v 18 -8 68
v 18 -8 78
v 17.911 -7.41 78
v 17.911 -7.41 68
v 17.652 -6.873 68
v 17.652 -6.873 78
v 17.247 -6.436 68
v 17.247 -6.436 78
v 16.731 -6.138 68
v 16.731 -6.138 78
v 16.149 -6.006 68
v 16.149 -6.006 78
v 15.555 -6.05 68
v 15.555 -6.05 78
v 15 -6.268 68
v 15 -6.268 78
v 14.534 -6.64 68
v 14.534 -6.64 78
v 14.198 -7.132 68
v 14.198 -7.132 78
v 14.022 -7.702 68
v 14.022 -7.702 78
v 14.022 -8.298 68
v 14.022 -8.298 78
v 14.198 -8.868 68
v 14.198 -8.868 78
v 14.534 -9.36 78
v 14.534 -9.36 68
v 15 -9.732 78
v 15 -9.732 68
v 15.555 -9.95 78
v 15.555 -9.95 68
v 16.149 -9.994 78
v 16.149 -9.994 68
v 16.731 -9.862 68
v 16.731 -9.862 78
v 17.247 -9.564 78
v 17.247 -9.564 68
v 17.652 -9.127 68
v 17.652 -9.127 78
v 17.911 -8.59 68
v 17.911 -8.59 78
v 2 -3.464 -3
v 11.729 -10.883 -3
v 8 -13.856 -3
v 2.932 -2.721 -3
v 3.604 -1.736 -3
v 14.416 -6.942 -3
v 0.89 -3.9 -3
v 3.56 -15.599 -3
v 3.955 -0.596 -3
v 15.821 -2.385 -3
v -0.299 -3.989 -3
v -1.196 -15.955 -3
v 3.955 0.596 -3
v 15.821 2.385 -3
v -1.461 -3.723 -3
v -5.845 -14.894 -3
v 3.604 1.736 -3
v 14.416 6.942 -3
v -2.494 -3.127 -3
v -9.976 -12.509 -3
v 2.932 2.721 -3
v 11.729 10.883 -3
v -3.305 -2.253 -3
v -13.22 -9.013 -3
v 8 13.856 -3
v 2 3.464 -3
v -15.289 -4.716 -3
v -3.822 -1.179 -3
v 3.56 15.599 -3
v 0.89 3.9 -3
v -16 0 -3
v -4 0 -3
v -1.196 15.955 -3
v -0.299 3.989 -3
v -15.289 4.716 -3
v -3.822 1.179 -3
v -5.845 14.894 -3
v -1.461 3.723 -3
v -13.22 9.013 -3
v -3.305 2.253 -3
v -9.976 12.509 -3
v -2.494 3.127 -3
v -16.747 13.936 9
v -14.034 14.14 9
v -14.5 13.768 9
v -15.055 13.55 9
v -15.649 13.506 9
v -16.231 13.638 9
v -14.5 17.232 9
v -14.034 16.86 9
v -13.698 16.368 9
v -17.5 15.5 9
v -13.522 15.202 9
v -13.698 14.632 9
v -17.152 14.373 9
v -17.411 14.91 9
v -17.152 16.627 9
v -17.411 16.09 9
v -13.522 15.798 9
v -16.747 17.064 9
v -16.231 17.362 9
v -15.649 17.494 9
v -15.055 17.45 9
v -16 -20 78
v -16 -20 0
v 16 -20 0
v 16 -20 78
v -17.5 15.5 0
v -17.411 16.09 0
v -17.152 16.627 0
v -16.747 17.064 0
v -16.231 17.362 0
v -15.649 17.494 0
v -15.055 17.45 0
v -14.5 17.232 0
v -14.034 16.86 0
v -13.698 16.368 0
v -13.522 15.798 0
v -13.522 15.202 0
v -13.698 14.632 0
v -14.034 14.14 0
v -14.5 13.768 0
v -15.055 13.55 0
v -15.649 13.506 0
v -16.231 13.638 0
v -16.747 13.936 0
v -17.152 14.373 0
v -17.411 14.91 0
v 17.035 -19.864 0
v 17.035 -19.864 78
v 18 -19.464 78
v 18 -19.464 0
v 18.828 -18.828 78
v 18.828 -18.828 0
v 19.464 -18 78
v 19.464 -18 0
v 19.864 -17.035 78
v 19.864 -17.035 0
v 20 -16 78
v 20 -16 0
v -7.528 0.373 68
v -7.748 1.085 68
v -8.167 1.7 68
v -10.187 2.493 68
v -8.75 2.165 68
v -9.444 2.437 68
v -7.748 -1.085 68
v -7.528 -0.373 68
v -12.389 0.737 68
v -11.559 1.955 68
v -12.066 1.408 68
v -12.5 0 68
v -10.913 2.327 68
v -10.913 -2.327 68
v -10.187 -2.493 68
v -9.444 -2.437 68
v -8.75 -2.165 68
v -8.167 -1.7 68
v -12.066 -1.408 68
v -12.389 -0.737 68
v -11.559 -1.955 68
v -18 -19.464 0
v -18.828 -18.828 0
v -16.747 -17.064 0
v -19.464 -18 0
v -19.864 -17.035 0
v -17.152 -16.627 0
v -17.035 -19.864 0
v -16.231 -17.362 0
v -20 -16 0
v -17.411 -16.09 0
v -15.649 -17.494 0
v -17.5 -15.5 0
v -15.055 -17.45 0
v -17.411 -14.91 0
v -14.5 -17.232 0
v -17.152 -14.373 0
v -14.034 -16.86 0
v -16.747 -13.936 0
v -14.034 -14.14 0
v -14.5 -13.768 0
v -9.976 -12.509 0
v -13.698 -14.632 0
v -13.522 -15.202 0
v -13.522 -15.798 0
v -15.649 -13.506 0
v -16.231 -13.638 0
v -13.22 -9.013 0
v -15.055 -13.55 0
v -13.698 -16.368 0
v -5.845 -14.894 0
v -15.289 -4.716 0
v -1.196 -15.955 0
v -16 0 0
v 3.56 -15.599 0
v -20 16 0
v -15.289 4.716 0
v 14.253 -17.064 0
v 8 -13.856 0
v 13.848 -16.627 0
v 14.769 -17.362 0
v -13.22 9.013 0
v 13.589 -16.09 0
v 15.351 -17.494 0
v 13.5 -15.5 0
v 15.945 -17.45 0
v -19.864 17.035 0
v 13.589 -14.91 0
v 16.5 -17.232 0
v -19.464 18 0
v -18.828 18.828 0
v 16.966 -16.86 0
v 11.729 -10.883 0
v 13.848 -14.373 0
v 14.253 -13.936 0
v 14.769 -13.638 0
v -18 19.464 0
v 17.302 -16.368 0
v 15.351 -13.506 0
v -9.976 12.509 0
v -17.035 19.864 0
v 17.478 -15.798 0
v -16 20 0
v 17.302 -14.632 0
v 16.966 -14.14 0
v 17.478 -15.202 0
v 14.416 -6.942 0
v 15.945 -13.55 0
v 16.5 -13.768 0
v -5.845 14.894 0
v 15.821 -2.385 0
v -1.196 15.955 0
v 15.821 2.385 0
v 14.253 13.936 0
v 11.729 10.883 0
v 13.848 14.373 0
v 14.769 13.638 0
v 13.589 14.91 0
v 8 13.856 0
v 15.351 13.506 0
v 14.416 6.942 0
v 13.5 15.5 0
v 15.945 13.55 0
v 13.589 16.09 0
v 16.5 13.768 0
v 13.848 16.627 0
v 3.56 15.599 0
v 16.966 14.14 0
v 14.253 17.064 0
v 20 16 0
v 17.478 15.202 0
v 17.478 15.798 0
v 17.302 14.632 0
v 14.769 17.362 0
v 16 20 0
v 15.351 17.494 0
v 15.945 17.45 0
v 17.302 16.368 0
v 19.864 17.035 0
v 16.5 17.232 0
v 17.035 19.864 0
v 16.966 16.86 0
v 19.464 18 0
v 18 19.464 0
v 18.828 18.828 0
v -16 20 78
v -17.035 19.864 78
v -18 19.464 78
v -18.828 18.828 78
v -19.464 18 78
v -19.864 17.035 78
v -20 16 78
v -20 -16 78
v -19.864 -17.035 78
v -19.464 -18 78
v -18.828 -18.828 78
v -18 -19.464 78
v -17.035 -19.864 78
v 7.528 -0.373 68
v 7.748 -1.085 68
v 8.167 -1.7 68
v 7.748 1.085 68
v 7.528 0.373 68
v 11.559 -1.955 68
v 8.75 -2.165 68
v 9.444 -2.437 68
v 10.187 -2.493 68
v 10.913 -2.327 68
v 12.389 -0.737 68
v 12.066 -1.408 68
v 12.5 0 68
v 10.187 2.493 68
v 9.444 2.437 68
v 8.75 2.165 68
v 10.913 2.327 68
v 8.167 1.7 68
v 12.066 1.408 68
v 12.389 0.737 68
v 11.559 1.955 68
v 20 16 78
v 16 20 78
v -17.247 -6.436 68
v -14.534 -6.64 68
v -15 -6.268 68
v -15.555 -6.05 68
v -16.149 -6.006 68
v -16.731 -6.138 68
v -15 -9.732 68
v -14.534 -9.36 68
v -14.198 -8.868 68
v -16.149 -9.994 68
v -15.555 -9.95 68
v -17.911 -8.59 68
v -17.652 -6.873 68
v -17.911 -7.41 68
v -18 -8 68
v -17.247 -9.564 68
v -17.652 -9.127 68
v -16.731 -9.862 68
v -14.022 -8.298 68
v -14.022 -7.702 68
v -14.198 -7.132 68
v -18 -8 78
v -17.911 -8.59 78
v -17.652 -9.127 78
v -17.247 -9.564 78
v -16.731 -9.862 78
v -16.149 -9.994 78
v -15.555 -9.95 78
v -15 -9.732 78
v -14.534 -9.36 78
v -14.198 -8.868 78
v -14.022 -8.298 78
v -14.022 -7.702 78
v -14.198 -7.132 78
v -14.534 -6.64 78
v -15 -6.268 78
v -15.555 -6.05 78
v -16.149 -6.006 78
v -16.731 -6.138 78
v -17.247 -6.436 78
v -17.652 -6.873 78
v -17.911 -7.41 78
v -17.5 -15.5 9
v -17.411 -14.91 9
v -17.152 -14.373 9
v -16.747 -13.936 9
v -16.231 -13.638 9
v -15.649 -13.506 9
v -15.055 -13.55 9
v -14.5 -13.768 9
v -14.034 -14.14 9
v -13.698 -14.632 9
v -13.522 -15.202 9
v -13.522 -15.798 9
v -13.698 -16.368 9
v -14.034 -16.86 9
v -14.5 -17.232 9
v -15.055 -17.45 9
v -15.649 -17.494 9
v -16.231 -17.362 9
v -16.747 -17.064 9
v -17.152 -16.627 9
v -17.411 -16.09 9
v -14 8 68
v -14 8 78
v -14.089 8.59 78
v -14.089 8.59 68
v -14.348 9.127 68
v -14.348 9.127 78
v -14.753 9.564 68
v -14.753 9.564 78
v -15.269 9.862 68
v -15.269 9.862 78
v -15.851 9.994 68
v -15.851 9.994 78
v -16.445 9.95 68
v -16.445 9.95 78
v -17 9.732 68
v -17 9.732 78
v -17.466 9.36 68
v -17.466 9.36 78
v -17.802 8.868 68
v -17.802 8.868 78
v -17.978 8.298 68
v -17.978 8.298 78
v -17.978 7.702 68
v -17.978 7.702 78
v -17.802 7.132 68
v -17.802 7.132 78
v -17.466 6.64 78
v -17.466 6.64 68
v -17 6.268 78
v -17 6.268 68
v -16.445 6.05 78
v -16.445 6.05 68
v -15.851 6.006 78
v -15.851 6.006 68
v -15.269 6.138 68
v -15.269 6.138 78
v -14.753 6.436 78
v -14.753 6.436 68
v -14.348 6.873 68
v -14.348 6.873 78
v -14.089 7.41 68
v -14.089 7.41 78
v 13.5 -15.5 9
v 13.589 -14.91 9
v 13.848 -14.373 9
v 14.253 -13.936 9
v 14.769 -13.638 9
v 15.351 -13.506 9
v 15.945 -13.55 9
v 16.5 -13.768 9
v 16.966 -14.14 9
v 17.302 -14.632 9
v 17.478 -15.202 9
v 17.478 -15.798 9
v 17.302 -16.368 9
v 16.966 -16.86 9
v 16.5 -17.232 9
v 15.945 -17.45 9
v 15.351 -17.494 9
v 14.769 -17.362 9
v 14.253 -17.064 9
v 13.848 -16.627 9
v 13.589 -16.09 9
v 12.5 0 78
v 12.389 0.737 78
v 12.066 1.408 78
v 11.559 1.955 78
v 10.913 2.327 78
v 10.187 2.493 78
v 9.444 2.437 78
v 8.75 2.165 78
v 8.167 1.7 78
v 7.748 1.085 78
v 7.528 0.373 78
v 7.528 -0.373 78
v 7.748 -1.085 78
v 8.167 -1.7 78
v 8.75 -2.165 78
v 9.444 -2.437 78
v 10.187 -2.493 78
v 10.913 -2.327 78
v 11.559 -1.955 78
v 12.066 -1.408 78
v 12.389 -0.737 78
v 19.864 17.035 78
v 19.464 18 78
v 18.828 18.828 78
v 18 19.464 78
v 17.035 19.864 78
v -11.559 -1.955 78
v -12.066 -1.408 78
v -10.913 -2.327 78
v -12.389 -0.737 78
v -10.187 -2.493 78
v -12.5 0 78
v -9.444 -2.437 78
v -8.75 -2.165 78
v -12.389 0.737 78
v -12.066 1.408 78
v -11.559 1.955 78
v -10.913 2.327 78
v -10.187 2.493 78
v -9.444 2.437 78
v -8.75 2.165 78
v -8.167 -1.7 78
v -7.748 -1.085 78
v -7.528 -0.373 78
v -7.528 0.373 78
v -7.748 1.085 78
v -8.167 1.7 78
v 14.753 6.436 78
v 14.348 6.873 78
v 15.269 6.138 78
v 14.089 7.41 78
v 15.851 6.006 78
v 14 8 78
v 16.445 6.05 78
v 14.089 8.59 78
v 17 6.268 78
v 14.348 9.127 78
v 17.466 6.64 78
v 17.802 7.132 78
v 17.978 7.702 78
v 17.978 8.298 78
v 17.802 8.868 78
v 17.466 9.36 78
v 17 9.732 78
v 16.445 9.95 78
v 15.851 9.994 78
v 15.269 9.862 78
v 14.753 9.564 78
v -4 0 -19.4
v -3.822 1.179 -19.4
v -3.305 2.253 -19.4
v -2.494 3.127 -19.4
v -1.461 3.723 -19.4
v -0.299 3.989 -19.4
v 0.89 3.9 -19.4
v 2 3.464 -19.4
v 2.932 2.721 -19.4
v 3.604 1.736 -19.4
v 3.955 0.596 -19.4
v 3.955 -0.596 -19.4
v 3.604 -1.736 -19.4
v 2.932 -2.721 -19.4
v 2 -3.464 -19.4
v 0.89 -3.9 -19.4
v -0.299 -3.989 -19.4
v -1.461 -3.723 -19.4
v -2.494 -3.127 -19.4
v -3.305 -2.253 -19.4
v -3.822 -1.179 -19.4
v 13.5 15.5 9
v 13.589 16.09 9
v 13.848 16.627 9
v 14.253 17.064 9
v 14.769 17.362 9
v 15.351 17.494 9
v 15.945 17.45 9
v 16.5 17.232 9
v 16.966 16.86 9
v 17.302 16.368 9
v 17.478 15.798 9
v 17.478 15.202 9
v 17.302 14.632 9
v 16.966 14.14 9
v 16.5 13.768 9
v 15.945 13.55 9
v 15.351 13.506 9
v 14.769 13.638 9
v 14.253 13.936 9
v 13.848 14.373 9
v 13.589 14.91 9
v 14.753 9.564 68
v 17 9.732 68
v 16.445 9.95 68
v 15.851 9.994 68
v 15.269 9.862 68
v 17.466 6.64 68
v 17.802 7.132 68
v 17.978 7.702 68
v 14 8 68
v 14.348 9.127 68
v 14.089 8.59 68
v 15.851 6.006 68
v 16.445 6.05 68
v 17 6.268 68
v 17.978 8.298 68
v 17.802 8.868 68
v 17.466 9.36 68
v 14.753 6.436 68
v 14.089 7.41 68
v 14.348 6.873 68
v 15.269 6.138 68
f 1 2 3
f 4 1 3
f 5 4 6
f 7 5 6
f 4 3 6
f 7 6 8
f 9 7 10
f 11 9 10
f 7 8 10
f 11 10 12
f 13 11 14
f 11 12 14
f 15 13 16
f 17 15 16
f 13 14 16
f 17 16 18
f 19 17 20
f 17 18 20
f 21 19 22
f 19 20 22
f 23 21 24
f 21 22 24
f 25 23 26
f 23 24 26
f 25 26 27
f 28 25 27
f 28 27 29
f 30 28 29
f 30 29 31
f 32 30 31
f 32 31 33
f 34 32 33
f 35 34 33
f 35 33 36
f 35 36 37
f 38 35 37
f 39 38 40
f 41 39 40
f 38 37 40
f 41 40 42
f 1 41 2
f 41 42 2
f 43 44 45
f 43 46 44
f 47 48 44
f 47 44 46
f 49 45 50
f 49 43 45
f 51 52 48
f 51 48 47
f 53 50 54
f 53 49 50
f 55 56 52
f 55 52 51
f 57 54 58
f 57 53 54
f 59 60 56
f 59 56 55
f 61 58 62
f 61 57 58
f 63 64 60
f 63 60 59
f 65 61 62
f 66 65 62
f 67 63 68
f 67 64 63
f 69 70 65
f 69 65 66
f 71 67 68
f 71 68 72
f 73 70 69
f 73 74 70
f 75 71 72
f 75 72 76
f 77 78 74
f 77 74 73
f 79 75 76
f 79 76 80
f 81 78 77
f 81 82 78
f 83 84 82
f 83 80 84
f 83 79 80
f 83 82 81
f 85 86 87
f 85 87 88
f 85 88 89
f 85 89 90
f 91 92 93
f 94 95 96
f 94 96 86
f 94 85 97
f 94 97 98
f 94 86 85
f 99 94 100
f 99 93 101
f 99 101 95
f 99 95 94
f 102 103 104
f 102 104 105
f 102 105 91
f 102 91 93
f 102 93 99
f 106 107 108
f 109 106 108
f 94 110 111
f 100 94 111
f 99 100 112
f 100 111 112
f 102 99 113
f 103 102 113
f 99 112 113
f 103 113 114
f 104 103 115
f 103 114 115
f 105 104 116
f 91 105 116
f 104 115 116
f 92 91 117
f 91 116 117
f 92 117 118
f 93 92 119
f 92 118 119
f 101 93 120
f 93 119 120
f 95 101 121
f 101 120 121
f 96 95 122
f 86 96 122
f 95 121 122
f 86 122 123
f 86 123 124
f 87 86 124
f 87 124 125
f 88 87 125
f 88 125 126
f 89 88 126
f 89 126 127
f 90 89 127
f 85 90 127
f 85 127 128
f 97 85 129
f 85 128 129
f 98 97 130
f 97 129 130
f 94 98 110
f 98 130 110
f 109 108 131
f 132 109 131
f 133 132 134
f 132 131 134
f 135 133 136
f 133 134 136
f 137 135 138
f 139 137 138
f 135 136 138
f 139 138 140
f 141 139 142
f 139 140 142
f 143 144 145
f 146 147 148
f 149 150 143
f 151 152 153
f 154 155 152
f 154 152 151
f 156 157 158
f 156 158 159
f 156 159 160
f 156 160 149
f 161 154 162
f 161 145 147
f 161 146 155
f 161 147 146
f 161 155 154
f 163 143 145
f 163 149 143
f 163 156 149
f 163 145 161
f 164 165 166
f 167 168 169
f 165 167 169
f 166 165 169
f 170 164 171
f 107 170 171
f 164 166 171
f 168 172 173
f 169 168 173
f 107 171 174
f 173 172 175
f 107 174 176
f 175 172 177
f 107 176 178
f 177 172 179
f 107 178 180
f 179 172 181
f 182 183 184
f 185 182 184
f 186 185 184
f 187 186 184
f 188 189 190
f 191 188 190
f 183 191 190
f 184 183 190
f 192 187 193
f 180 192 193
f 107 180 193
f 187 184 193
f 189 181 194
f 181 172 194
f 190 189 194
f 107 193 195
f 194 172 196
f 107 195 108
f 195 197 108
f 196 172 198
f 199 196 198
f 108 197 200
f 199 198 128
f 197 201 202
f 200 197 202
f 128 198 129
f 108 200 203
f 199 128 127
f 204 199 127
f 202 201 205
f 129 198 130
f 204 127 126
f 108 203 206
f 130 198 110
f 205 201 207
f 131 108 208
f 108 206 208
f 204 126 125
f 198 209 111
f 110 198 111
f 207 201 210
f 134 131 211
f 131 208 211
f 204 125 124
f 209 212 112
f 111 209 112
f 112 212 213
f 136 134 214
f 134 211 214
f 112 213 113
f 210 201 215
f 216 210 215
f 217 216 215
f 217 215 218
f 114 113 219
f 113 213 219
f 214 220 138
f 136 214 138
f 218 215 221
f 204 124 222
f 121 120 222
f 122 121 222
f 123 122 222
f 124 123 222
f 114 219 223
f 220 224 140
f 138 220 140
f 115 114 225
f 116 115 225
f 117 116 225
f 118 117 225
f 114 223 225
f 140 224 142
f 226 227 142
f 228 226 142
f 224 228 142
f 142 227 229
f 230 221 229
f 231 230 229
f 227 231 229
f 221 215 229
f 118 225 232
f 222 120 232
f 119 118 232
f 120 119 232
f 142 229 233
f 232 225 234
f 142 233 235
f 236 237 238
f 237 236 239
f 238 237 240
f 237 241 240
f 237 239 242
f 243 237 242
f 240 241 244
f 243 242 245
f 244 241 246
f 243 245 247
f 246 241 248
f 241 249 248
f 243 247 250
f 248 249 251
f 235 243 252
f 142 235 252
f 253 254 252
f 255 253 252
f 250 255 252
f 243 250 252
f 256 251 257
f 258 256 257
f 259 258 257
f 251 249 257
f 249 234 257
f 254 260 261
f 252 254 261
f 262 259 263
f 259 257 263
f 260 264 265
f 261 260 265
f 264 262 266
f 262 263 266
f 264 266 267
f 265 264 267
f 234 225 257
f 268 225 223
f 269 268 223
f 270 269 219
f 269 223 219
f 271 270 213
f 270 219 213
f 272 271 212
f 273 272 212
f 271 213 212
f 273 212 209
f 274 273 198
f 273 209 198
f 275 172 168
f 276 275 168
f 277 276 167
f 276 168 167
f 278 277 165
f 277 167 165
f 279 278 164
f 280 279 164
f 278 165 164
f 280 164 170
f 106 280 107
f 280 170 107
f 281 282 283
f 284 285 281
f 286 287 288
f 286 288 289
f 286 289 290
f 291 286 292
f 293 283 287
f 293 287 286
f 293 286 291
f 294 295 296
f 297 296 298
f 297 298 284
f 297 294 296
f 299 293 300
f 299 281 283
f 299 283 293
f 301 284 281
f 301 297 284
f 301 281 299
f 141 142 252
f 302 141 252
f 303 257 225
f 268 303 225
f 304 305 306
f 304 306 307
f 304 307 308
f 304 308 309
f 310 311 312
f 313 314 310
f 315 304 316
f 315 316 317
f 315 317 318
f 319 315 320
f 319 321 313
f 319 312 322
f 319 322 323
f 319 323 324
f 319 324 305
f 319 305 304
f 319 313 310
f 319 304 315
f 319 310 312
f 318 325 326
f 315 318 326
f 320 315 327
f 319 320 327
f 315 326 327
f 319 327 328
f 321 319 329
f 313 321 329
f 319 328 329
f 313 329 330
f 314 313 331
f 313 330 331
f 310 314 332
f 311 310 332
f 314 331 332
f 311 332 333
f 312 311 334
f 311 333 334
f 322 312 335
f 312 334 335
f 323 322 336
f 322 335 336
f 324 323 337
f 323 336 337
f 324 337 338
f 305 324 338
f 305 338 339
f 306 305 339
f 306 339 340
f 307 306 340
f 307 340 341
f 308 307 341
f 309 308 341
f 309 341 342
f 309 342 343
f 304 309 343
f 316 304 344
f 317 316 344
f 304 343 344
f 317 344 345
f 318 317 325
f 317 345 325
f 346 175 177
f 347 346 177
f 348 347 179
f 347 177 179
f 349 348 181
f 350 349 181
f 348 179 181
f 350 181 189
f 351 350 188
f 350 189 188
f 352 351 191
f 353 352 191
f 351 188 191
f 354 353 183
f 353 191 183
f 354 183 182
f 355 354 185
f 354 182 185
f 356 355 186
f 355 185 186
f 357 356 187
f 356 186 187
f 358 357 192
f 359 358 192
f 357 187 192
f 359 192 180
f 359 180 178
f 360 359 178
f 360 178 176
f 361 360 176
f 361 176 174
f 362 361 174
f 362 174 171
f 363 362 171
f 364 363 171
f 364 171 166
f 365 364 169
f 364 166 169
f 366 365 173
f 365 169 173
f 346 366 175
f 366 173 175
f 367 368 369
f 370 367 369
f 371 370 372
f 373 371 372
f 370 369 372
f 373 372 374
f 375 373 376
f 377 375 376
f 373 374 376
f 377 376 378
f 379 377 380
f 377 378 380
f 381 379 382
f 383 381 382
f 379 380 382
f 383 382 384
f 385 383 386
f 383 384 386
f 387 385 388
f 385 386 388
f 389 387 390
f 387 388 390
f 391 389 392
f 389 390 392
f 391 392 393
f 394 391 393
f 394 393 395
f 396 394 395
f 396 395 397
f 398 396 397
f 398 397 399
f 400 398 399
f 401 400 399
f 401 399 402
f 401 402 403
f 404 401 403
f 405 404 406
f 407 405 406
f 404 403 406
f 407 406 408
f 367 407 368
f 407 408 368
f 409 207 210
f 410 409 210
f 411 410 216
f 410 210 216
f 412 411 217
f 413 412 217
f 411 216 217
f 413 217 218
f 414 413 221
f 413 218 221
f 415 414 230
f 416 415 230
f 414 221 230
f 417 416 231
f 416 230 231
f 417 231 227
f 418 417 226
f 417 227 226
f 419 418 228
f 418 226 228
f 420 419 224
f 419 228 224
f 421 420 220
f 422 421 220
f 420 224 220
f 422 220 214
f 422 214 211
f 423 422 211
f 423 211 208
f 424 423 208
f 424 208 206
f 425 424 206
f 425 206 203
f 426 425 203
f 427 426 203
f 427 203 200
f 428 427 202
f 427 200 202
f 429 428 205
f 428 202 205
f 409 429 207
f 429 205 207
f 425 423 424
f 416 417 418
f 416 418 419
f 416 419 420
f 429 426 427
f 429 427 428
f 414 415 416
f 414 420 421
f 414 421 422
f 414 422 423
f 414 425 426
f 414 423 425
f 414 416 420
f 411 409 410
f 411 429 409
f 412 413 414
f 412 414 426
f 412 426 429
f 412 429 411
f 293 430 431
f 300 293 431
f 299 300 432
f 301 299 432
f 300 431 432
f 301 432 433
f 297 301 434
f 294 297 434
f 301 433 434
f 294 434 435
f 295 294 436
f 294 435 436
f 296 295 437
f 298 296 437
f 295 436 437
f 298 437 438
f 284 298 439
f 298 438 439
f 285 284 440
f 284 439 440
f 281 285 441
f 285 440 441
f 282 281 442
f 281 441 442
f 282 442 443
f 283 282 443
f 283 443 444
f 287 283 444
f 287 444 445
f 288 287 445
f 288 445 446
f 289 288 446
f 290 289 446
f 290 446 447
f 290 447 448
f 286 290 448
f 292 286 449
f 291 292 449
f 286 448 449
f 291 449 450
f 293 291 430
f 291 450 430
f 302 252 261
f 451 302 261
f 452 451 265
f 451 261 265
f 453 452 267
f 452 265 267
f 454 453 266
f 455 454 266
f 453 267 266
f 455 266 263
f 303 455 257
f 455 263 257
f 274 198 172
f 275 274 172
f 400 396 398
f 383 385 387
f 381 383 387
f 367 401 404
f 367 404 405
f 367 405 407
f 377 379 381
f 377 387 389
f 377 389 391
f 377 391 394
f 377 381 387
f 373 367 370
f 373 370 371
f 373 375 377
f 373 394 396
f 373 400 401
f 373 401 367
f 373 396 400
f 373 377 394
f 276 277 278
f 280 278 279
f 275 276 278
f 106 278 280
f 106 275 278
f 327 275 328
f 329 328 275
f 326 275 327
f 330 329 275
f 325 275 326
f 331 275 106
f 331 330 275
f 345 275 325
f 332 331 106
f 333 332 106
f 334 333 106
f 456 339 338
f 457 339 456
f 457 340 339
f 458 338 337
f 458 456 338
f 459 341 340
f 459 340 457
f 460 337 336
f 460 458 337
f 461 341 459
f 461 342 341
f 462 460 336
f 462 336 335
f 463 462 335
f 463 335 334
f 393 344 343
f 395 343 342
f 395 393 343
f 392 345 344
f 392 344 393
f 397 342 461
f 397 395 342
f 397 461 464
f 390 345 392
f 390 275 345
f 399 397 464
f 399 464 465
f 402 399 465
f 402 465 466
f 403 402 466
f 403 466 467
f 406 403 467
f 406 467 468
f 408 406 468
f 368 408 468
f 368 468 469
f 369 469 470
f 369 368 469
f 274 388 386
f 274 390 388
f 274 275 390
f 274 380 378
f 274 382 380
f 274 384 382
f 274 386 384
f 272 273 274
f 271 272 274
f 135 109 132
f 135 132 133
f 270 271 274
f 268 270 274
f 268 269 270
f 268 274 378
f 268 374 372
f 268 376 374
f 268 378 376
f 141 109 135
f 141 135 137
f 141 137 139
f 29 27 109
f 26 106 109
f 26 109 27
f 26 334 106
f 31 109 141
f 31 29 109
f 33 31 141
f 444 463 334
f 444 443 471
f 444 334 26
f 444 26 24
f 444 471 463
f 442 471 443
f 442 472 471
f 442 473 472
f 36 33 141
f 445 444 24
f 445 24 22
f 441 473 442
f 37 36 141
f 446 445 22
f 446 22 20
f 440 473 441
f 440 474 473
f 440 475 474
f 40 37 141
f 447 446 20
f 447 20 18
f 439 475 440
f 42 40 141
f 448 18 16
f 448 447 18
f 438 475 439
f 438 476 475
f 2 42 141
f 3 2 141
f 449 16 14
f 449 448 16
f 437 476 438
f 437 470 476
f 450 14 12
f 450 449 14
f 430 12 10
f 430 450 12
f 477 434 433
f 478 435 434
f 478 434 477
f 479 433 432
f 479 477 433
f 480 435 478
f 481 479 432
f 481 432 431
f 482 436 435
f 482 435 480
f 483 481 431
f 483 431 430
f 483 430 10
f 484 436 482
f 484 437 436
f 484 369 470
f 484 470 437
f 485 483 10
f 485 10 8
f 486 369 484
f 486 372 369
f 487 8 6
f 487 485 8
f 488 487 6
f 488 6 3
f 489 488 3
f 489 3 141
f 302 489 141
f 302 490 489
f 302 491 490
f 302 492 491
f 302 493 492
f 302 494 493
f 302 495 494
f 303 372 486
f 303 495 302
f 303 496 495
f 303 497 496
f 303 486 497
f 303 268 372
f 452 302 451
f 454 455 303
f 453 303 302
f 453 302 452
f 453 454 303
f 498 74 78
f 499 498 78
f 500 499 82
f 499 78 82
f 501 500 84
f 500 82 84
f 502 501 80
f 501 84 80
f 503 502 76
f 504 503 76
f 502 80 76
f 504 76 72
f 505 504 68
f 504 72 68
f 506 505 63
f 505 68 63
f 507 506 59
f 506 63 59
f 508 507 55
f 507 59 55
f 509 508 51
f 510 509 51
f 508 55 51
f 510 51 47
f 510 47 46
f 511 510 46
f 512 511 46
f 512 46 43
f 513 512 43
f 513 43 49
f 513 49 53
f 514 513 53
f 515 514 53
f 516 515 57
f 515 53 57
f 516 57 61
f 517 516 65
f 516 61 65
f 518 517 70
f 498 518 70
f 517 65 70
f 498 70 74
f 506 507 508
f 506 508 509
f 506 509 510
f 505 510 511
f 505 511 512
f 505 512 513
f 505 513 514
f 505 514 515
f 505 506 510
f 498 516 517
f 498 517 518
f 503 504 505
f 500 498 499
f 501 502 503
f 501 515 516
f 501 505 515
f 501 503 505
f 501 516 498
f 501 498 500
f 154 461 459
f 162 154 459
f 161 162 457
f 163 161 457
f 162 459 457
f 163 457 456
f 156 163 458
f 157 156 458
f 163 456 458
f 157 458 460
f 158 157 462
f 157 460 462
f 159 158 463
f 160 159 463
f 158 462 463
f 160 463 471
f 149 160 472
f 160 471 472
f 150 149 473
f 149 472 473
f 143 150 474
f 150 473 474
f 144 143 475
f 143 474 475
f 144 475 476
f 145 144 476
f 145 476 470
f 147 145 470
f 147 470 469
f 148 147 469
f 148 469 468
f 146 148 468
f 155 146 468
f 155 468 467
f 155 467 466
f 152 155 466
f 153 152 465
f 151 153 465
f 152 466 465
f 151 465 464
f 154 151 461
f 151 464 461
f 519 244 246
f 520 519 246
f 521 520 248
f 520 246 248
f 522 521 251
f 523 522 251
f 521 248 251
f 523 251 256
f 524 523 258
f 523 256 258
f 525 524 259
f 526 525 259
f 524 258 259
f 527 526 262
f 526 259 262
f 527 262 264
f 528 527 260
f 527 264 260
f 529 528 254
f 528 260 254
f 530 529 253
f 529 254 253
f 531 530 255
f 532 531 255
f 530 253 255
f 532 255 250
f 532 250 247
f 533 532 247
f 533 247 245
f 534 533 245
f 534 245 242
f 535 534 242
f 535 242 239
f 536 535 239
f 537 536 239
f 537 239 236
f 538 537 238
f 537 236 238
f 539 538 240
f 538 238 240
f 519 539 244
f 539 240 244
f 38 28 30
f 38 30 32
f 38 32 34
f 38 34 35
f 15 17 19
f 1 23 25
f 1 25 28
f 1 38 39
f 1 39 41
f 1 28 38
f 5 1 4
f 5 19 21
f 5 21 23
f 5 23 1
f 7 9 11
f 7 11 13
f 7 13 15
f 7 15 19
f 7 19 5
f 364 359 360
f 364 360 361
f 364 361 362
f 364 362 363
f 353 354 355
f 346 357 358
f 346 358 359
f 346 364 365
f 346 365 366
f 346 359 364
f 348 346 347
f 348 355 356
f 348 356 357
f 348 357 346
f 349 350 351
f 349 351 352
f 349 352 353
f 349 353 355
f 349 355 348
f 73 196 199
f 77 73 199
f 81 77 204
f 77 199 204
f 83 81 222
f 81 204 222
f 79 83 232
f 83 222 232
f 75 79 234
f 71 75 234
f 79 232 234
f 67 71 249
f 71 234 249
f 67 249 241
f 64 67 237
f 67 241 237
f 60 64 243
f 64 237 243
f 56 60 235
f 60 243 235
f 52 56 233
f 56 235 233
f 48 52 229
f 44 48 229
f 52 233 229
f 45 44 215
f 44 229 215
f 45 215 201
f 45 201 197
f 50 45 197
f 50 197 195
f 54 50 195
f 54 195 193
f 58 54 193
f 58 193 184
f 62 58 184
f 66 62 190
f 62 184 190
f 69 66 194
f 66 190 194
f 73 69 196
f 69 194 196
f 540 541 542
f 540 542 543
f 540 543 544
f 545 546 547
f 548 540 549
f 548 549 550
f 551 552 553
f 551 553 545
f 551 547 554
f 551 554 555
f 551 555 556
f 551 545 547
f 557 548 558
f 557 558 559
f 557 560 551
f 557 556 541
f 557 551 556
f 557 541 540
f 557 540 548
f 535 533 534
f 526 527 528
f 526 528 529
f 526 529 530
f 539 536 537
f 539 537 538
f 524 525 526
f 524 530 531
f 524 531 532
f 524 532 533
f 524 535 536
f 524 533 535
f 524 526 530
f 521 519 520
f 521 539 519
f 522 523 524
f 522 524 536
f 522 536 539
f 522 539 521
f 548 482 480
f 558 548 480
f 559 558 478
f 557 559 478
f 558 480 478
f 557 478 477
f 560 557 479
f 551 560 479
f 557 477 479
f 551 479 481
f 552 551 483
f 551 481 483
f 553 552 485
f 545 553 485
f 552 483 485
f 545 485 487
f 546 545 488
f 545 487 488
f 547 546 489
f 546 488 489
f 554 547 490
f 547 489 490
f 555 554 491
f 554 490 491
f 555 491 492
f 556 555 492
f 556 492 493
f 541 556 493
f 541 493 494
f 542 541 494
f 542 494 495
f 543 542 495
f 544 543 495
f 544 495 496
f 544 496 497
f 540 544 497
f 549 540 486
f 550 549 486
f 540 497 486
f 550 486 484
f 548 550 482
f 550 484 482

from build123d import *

# Parameters (mm, degrees)
BOSS_EXTRUDE1_DEPTH = 78
SKETCH4_R           = 16
BOSS_EXTRUDE2_DEPTH = 3
SKETCH5_R           = 4
BOSS_EXTRUDE3_DEPTH = 16.4
SKETCH7_R           = 2
CUT_EXTRUDE2_DEPTH  = 9
SKETCH8_R           = 2
CUT_EXTRUDE3_DEPTH  = 10
SKETCH9_R           = 2.5
CUT_EXTRUDE4_DEPTH  = 10


with BuildPart() as part:
    # Sketch3 → Boss-Extrude1 (new body)
    with BuildSketch(Plane.XY):
        with BuildLine():
            Line((-16, -20), (16, -20))
            ThreePointArc((16, -20), (18.828427125, -18.828427125), (20, -16))
            Line((20, -16), (20, 16))
            ThreePointArc((20, 16), (18.828427125, 18.828427125), (16, 20))
            Line((16, 20), (-16, 20))
            ThreePointArc((-16, 20), (-18.828427125, 18.828427125), (-20, 16))
            Line((-20, 16), (-20, -16))
            ThreePointArc((-20, -16), (-18.828427125, -18.828427125), (-16, -20))
        make_face()
    extrude(amount=BOSS_EXTRUDE1_DEPTH)

    # Sketch4 → Boss-Extrude2 (add)
    with BuildSketch(Plane(origin=(0, 0, 0), x_dir=(-1, 0, 0), z_dir=(0, 0, -1))):
        Circle(SKETCH4_R)
    extrude(amount=BOSS_EXTRUDE2_DEPTH)

    # Sketch5 → Boss-Extrude3 (add)
    with BuildSketch(Plane(origin=(0, 0, -3), x_dir=(-1, 0, 0), z_dir=(0, 0, -1))):
        Circle(SKETCH5_R)
    extrude(amount=BOSS_EXTRUDE3_DEPTH)

    # Sketch7 → Cut-Extrude2 (cut)
    with BuildSketch(Plane(origin=(0, 0, 0), x_dir=(-1, 0, 0), z_dir=(0, 0, -1))):
        with Locations((-15.5, 15.5)):
            Circle(SKETCH7_R)
        with Locations((15.5, 15.5)):
            Circle(SKETCH7_R)
        with Locations((15.5, -15.5)):
            Circle(SKETCH7_R)
        with Locations((-15.5, -15.5)):
            Circle(SKETCH7_R)
    extrude(amount=-CUT_EXTRUDE2_DEPTH, mode=Mode.SUBTRACT)

    # Sketch8 → Cut-Extrude3 (cut)
    with BuildSketch(Plane.XY.offset(78)):
        with Locations((-16, 8)):
            Circle(SKETCH8_R)
        with Locations(Location((16, 8, 0), (0, 0, 180))):
            Circle(SKETCH8_R)
        with Locations(Location((-16, -8, 0), (0, 0, 180))):
            Circle(SKETCH8_R)
        with Locations((16, -8)):
            Circle(SKETCH8_R)
    extrude(amount=-CUT_EXTRUDE3_DEPTH, mode=Mode.SUBTRACT)

    # Sketch9 → Cut-Extrude4 (cut)
    with BuildSketch(Plane.XY.offset(78)):
        with Locations((10, 0)):
            Circle(SKETCH9_R)
        with Locations(Location((-10, 0, 0), (0, 0, 180))):
            Circle(SKETCH9_R)
    extrude(amount=-CUT_EXTRUDE4_DEPTH, mode=Mode.SUBTRACT)


solid = part.part
